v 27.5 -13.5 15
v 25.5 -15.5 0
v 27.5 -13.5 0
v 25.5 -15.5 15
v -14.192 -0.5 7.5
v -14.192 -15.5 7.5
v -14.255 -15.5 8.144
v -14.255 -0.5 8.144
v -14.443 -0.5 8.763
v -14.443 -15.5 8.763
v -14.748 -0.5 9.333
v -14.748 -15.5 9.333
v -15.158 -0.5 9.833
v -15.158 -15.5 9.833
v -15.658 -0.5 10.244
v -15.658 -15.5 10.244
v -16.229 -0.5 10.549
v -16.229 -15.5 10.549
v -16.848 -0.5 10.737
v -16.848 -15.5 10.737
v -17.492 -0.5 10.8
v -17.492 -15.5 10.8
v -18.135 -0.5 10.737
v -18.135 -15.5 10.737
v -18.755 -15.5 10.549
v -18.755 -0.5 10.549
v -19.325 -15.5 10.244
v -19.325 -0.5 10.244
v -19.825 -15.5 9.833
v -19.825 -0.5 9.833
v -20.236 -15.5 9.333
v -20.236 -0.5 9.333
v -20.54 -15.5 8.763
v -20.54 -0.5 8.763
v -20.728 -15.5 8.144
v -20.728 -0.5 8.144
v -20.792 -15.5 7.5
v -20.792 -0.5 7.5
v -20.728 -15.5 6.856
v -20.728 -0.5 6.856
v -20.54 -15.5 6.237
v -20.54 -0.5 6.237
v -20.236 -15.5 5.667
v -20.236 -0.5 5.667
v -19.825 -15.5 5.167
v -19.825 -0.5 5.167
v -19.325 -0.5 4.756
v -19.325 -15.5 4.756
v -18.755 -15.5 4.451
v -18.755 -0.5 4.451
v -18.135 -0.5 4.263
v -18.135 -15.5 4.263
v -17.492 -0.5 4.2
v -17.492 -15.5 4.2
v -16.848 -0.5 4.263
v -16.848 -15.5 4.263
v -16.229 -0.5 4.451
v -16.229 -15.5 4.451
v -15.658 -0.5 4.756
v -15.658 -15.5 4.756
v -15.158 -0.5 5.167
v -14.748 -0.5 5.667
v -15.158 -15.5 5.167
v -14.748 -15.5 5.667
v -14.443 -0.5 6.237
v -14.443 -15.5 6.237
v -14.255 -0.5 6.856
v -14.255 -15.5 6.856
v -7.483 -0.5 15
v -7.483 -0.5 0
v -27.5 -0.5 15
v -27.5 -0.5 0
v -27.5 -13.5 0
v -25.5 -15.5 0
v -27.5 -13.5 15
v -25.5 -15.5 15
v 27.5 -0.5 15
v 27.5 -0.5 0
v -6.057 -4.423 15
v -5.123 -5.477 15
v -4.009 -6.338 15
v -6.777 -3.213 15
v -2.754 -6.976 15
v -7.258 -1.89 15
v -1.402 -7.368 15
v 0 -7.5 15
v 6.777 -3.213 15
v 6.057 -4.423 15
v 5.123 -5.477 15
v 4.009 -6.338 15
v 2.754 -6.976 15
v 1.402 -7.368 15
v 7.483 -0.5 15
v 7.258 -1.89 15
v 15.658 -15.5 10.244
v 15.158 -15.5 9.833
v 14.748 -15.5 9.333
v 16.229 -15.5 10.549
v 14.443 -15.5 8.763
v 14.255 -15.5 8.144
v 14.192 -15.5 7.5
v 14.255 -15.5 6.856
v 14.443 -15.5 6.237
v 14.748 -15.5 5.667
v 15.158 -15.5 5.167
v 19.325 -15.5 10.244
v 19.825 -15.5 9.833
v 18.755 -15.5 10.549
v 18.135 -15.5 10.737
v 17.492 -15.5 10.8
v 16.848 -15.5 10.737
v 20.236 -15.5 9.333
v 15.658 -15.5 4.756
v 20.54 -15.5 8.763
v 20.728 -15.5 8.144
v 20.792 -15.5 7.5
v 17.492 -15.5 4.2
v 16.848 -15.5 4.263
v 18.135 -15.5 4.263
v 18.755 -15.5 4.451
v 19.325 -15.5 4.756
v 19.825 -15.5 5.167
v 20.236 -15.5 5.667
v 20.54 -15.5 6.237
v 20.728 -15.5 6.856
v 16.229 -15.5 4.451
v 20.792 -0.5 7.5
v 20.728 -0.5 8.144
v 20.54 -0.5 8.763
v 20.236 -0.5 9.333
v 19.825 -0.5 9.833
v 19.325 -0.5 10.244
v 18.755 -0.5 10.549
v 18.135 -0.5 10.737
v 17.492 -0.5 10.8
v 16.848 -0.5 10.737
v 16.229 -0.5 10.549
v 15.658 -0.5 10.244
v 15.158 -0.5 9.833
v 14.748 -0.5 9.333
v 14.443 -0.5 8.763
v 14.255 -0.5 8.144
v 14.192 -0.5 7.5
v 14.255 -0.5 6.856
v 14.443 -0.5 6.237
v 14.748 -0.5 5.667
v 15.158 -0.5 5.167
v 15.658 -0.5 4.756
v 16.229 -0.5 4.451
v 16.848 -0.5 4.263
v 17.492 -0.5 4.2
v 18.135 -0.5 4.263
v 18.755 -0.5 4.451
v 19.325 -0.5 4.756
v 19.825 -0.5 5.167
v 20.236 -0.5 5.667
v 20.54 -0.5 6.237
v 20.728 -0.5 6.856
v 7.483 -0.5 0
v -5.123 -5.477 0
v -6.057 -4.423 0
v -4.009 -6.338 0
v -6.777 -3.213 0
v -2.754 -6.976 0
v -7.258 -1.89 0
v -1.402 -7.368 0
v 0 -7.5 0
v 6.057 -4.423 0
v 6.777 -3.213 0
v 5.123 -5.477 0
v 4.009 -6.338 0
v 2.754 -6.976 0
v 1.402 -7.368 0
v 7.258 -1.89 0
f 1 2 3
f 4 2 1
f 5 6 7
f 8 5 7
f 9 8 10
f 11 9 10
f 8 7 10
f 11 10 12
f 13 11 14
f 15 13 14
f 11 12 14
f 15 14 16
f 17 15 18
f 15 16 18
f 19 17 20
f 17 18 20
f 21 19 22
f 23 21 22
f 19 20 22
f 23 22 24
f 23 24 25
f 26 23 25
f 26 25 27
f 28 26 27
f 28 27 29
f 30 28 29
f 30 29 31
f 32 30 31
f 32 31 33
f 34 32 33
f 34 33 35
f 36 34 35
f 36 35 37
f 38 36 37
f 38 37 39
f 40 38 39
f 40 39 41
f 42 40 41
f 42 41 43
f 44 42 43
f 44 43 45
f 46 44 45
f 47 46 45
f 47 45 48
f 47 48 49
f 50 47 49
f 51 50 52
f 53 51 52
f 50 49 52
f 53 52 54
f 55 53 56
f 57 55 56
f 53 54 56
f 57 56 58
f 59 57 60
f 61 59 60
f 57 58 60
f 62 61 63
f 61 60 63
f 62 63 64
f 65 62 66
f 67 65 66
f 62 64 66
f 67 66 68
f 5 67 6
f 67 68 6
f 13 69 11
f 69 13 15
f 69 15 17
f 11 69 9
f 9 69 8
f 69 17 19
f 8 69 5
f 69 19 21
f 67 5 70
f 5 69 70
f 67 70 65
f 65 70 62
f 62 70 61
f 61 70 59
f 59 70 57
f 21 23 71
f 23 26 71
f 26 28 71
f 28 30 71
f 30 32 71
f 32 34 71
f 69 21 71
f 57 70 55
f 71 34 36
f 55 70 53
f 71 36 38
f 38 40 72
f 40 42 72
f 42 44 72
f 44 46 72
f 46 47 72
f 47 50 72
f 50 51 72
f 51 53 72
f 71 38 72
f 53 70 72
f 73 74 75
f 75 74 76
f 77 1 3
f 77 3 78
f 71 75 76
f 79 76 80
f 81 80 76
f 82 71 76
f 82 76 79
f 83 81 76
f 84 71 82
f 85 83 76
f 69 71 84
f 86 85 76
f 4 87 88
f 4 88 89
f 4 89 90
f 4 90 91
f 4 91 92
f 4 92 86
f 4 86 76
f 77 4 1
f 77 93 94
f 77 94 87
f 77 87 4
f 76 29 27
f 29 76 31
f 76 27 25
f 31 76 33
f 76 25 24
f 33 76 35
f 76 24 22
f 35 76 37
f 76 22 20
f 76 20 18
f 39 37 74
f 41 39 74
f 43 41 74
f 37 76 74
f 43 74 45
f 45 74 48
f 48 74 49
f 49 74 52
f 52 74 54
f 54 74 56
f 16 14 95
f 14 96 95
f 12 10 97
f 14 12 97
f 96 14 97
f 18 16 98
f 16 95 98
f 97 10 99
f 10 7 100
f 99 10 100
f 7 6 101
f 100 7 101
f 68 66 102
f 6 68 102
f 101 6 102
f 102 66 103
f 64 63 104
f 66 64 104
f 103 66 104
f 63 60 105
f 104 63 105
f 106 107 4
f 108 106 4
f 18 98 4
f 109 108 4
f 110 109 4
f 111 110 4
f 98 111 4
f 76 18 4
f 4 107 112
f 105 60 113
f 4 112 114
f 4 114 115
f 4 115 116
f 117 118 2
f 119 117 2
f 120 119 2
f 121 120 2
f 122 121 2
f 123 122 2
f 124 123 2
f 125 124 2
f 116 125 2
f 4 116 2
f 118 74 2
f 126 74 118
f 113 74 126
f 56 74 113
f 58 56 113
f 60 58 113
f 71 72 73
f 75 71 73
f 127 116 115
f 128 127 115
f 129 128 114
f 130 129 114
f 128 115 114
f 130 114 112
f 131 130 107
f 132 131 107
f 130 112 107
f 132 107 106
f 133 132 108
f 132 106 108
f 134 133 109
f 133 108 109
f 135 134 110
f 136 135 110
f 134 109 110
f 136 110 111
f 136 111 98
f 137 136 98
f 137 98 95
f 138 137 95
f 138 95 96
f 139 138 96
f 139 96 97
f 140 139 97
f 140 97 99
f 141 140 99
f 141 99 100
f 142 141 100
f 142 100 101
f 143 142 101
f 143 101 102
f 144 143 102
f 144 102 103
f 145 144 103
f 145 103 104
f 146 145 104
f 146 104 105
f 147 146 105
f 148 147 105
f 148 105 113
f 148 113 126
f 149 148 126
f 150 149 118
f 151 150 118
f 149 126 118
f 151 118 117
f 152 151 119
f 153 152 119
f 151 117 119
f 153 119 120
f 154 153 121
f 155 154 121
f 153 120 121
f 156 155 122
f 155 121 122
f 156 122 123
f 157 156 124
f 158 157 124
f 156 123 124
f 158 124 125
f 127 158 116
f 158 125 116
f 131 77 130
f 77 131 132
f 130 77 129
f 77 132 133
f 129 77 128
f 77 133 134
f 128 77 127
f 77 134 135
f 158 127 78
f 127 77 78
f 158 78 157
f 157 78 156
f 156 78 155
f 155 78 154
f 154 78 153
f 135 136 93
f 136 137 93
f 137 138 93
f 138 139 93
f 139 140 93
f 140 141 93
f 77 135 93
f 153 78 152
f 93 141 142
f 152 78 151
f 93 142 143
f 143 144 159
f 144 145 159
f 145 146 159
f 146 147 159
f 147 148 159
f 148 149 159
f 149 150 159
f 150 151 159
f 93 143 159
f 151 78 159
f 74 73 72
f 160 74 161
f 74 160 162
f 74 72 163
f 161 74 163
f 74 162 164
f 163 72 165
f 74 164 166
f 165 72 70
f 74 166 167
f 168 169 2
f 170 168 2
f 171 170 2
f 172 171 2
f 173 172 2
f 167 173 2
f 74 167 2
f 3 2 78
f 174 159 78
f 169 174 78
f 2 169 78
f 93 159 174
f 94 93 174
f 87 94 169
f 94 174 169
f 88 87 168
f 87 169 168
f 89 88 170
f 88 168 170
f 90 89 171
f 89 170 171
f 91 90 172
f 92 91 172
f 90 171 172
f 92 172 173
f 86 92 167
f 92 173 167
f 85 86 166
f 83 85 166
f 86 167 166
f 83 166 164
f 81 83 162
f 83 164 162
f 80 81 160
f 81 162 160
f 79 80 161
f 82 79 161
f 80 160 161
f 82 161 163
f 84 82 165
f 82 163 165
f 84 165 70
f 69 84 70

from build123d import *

# Parameters (mm, degrees)
F1_DEPTH = 15
F3_D     = 6.6
F4_SIZE2 = 2
F4_SIZE  = 2


with BuildPart() as f1:
    # F0 (on Top) → F1 (new body)
    with BuildSketch(Plane.XY):
        with BuildLine():
            ThreePointArc((7.483315, -0.5), (0, -7.5), (-7.483315, -0.5))
            Line((-7.483315, -0.5), (-27.5, -0.5))
            Line((-27.5, -0.5), (-27.5, -15.5))
            Line((-27.5, -15.5), (27.5, -15.5))
            Line((27.5, -15.5), (27.5, -0.5))
            Line((27.5, -0.5), (7.483315, -0.5))
        make_face()
    extrude(amount=F1_DEPTH)

    # F3 (through all)
    with Locations(Plane(origin=(0, -0.5, 0), x_dir=(-1, 0, 0), z_dir=(0, 1, 0))):
        with Locations((17.491657, 7.5), (-17.491657, 7.5)):
            Hole(F3_D / 2)

    # F4
    f4_edges = [f1.edges().sort_by_distance(p)[0] for p in [
        (-27.5, -15.5, 7.5),
        (27.5, -15.5, 7.5),
    ]]
    chamfer(f4_edges, length=F4_SIZE, length2=F4_SIZE2)


solid = f1.part
